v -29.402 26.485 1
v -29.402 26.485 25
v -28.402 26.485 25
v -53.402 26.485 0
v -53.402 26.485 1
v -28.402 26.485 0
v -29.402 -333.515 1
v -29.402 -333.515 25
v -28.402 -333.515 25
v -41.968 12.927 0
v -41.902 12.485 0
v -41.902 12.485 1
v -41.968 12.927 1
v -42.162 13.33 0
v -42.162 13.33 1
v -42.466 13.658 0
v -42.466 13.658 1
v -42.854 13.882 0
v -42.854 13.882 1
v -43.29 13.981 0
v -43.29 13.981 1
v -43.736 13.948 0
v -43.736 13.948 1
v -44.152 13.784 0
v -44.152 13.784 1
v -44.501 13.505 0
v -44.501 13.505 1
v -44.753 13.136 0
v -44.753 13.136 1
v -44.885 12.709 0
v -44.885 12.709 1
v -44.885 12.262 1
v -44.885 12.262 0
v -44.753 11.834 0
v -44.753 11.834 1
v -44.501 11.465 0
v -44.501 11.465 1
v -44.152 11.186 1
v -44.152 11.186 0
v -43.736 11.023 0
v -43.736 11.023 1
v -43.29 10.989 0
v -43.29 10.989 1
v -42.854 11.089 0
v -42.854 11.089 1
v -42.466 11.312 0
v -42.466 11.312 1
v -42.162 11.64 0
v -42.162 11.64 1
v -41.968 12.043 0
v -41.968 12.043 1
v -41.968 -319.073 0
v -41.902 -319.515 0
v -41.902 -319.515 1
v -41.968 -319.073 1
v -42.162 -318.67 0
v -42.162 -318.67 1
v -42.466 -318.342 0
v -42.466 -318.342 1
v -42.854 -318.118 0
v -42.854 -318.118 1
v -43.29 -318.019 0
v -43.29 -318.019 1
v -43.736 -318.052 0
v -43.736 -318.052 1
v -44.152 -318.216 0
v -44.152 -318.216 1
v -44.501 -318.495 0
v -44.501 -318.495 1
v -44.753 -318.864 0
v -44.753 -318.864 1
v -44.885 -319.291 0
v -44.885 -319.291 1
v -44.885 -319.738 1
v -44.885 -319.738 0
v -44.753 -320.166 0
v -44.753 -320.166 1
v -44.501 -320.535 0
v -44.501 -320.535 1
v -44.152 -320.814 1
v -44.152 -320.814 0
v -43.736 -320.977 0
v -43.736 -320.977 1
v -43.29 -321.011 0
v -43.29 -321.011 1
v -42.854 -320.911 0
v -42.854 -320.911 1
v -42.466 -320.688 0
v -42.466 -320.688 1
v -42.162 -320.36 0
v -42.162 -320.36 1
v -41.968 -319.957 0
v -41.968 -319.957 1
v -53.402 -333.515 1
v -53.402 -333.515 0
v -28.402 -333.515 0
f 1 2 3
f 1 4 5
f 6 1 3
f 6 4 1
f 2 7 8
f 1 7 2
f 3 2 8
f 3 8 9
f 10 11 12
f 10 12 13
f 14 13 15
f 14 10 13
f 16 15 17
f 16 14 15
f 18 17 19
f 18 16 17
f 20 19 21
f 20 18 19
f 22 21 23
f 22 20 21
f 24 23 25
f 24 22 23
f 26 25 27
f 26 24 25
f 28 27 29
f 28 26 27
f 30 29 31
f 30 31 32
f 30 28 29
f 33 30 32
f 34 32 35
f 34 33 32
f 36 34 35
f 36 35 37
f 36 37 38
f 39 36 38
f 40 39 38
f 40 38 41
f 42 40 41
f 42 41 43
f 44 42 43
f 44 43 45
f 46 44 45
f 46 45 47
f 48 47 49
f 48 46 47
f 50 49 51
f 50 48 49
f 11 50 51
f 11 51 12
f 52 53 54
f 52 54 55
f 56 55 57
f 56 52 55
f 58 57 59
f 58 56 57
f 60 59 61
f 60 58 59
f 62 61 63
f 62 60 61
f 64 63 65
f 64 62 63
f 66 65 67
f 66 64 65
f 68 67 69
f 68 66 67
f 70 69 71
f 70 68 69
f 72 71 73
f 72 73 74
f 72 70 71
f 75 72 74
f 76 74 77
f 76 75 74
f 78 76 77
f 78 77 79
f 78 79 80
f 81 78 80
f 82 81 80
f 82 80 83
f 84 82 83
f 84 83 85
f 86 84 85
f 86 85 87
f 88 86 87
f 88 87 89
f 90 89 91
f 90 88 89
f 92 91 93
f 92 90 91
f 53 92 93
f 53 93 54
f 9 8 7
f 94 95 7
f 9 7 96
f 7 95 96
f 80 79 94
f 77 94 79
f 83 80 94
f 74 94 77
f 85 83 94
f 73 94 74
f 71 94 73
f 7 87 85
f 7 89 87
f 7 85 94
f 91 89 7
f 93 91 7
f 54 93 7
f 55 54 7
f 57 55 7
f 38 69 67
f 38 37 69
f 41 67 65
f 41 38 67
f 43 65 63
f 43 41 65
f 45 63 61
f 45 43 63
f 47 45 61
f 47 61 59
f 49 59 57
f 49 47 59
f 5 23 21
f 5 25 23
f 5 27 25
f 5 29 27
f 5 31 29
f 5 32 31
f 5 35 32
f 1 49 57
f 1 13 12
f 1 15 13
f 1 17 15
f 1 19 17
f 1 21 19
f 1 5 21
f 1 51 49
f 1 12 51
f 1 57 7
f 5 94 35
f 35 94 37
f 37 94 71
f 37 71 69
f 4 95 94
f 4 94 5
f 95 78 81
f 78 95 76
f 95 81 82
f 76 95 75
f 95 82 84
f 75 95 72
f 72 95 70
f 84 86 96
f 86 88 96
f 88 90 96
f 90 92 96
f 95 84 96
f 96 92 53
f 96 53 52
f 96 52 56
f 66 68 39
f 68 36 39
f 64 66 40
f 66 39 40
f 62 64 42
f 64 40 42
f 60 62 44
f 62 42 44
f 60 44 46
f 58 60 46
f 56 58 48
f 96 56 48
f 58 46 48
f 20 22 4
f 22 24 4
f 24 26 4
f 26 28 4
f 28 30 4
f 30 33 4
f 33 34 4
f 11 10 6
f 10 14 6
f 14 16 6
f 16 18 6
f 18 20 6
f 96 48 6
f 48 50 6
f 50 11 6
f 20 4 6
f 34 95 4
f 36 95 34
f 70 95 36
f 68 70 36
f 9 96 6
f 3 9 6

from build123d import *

# Parameters (mm, degrees)
CROQUIS1_W              = 24
CROQUIS1_H              = 360
CROQUIS1_R              = 1.5
SALIENTE_EXTRUIR1_DEPTH = 1
CROQUIS2_W              = 1
CROQUIS2_H              = 360
SALIENTE_EXTRUIR2_DEPTH = 25


with BuildPart() as part:
    # Croquis1 → Saliente-Extruir1 (new body)
    with BuildSketch(Plane.XY):
        with Locations((-41.401725042, -153.514805415)):
            Rectangle(CROQUIS1_W, CROQUIS1_H)
        with Locations((-43.401725042, 12.485194585)):
            Circle(CROQUIS1_R, mode=Mode.SUBTRACT)
        with Locations((-43.401725042, -319.514805415)):
            Circle(CROQUIS1_R, mode=Mode.SUBTRACT)
    extrude(amount=SALIENTE_EXTRUIR1_DEPTH)

    # Croquis2 → Saliente-Extruir2 (add)
    with BuildSketch(Plane.XY):
        with Locations((-28.901725042, -153.514805415)):
            Rectangle(CROQUIS2_W, CROQUIS2_H)
    extrude(amount=SALIENTE_EXTRUIR2_DEPTH)


solid = part.part
